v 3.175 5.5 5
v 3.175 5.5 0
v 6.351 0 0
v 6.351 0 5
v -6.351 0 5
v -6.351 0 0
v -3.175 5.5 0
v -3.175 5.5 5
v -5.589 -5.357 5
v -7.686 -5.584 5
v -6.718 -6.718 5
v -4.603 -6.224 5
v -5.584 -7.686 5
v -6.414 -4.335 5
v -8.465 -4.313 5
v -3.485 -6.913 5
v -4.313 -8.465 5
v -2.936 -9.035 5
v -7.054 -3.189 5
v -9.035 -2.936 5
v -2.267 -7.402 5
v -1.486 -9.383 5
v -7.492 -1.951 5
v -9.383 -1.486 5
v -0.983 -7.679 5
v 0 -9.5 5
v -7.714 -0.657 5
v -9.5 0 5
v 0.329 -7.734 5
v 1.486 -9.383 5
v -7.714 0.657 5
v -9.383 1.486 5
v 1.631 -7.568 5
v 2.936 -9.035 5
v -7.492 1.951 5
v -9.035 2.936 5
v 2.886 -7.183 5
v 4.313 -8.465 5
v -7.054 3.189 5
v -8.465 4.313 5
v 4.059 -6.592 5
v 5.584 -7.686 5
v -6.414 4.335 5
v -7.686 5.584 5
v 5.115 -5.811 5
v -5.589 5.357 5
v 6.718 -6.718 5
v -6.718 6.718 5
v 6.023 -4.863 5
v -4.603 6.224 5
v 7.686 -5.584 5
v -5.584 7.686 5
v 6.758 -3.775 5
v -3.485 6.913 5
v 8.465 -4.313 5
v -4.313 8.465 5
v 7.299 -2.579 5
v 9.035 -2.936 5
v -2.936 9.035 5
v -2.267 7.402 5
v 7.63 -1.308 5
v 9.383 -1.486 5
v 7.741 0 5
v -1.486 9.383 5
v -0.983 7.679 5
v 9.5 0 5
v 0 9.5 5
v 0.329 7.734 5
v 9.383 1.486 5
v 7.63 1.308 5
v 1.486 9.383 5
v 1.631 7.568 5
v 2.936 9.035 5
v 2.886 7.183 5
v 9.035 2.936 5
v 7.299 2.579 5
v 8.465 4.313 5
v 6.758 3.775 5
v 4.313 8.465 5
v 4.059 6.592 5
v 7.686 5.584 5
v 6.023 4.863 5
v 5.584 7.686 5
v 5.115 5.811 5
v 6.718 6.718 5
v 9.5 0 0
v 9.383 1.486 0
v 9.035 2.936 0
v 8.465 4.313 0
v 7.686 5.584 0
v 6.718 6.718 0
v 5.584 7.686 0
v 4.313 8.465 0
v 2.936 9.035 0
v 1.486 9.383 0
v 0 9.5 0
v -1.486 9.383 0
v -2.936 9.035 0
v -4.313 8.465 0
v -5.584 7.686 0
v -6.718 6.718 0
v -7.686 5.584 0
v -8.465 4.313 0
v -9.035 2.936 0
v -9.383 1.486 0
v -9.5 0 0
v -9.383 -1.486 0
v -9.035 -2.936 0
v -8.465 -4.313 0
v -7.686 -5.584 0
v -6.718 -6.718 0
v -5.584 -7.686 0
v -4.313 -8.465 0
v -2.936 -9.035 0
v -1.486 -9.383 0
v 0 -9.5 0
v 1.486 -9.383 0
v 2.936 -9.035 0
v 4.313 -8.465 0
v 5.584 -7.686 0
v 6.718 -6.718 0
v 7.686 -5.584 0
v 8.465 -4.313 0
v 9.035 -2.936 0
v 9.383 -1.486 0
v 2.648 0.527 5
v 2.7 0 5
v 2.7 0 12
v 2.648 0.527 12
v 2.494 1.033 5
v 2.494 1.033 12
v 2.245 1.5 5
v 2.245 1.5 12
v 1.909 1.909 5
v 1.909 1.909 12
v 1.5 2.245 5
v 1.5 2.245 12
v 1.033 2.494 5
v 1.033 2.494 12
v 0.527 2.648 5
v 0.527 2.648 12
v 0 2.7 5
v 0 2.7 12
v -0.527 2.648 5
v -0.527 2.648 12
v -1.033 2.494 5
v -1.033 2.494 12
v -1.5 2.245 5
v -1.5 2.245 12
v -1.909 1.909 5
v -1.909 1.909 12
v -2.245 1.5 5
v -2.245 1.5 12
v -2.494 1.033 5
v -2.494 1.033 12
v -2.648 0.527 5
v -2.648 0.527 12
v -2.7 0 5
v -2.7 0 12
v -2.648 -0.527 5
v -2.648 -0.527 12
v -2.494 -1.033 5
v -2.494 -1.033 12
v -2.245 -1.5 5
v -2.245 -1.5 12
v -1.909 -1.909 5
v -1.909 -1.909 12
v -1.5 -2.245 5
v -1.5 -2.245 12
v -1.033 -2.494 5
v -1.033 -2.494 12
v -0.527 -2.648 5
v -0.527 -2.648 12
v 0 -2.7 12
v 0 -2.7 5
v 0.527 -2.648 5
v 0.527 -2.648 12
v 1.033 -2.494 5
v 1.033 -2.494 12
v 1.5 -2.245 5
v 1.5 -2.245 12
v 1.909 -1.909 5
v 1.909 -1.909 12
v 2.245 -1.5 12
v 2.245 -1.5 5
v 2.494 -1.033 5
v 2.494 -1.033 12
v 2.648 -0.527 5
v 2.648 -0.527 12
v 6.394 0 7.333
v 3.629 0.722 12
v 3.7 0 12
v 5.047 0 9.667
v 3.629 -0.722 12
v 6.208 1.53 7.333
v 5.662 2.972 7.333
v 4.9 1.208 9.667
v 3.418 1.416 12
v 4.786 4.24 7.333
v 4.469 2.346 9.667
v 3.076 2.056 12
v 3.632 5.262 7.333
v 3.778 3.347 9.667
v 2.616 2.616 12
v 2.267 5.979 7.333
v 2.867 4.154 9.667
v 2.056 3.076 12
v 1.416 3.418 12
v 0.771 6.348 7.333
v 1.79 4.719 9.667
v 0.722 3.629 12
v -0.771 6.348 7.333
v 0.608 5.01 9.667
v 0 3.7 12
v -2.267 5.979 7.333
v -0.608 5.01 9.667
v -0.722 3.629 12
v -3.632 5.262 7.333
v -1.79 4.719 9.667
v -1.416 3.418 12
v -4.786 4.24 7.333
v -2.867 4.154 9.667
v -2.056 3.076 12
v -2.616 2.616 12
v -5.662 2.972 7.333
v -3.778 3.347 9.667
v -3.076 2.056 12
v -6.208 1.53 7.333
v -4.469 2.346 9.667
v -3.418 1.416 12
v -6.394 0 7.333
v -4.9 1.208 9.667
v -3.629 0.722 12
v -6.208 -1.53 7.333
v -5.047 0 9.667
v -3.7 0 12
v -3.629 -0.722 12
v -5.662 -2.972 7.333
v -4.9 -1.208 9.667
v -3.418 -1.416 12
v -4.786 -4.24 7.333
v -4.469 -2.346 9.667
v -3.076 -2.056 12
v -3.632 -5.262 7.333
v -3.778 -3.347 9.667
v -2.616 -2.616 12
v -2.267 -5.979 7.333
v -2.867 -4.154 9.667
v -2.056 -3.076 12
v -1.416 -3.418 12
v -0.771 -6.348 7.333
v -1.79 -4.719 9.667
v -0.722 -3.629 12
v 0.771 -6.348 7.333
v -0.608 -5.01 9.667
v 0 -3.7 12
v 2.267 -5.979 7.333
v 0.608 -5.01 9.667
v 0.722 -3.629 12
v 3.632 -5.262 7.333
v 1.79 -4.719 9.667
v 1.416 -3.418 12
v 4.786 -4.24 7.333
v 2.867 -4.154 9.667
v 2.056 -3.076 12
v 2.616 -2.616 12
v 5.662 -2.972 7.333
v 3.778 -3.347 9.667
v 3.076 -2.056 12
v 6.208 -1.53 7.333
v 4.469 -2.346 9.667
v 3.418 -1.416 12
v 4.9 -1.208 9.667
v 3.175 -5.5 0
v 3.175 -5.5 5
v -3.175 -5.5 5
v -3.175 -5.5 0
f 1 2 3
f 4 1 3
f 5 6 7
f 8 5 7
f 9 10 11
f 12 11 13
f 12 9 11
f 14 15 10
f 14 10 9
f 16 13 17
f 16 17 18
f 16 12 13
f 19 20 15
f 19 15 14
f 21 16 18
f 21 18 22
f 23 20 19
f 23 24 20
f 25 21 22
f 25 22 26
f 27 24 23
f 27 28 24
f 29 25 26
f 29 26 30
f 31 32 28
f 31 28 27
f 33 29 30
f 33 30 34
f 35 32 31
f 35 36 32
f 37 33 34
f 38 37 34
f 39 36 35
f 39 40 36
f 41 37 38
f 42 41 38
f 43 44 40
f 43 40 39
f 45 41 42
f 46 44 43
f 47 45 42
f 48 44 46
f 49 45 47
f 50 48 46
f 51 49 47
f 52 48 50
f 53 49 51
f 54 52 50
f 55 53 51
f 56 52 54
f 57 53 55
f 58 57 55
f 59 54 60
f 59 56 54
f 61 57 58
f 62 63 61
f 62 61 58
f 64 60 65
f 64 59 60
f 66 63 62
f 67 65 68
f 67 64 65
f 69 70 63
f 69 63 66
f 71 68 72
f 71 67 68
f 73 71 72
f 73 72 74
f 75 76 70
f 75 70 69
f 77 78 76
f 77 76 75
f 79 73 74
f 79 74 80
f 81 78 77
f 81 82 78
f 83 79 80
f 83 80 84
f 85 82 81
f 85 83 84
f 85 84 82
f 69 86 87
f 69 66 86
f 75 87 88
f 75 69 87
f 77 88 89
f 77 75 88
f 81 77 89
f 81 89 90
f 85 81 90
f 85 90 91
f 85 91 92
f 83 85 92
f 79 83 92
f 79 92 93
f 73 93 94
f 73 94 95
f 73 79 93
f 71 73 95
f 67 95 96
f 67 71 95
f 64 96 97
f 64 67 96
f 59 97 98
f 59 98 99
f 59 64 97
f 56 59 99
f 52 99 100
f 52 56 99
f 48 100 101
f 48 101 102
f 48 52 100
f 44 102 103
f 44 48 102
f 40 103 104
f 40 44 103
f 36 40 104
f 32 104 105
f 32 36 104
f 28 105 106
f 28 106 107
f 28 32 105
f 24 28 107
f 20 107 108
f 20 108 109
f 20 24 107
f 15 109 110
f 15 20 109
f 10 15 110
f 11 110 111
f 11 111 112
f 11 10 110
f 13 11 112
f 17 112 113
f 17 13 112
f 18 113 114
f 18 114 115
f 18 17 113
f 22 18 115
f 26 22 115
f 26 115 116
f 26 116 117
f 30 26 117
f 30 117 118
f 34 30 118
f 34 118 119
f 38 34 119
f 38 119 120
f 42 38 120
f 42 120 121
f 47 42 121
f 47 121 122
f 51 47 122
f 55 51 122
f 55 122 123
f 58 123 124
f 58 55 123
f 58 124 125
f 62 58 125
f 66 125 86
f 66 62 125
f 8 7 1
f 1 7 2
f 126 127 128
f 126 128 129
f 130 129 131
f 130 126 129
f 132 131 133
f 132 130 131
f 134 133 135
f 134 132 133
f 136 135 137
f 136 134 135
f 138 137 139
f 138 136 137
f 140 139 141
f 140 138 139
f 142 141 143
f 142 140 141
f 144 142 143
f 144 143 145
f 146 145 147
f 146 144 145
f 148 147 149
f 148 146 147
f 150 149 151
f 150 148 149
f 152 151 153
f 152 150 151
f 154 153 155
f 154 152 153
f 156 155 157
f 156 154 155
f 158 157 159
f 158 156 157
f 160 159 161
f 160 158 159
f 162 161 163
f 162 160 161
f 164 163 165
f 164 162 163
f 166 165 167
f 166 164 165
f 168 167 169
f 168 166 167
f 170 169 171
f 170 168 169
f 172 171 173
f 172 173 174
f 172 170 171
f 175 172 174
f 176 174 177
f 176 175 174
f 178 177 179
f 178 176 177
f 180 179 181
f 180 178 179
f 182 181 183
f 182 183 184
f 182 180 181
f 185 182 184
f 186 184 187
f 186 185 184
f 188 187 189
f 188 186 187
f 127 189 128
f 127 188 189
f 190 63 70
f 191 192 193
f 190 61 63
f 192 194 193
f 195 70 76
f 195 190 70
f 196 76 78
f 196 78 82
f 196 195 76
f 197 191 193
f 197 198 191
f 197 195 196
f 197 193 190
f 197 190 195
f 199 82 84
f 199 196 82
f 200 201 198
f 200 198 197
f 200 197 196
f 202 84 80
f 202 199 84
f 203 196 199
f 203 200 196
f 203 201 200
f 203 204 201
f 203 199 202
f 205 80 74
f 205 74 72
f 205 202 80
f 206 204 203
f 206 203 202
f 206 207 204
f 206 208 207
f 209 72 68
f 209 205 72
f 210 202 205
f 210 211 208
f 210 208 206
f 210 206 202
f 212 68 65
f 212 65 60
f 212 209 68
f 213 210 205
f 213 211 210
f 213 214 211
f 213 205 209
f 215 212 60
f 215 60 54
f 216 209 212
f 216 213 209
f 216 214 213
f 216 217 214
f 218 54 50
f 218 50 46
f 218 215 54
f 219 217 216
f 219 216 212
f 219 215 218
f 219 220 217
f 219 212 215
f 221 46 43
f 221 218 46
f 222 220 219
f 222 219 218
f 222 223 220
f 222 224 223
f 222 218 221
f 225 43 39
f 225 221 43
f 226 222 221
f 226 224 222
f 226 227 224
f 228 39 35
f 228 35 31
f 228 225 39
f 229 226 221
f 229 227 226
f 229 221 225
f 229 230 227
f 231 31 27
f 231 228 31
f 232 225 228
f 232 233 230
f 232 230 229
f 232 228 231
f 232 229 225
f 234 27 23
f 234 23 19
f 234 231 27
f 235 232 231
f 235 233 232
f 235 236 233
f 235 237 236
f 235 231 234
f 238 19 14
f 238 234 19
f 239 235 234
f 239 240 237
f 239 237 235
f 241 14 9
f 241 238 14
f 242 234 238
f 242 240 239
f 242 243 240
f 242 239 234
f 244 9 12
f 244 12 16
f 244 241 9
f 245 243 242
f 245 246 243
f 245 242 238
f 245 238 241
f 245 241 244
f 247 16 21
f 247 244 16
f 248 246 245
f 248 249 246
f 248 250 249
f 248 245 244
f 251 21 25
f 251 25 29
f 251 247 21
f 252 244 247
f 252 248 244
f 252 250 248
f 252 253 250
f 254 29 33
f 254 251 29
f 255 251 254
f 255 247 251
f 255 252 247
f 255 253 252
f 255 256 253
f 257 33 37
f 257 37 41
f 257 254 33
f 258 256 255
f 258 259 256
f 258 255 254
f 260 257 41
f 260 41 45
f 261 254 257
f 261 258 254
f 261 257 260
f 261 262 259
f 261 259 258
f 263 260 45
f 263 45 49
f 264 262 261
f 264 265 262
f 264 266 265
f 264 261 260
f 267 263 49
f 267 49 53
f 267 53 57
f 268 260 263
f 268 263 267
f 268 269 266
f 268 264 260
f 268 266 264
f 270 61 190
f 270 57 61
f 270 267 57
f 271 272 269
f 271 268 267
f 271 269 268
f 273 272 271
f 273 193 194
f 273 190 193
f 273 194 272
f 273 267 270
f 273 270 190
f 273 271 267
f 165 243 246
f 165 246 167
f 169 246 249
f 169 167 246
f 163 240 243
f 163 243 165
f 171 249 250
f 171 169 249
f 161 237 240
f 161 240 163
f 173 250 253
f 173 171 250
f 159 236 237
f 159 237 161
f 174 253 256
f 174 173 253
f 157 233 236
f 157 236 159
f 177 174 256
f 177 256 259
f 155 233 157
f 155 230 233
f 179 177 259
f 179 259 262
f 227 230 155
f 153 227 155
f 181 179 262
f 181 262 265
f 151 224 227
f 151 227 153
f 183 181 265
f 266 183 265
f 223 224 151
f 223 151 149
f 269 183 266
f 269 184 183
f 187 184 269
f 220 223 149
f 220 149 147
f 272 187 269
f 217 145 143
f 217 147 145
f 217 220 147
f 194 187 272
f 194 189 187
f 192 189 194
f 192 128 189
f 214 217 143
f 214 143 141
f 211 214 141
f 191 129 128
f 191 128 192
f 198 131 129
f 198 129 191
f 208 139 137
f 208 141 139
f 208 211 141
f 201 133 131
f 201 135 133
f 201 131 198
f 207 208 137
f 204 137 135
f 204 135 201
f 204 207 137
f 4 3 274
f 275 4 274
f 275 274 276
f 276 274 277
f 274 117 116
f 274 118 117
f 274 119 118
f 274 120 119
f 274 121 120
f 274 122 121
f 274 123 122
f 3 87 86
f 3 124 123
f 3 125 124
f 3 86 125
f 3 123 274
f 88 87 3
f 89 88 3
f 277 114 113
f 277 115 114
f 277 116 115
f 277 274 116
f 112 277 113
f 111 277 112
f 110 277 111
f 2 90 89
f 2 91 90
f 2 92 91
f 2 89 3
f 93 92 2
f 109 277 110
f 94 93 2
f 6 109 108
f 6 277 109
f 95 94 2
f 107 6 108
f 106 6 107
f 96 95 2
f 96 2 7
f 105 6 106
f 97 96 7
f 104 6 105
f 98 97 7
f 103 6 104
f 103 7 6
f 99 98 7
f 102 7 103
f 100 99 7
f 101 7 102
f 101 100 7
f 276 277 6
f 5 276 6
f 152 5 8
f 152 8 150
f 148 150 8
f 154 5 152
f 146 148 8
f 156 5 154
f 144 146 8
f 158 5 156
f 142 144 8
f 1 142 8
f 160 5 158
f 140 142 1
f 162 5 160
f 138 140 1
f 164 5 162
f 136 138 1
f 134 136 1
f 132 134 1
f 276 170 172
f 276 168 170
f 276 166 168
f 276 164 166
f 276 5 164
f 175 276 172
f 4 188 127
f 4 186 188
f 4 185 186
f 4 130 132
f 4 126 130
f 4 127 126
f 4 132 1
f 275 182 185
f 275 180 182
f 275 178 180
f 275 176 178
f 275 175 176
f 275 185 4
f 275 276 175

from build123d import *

# Parameters (mm, degrees)
POCKET_DEPTH = 5


with BuildPart() as part:
    # Sketch → Revolution (revolve)
    with BuildSketch(Plane.XZ):
        Polygon((2.7, 12), (2.7, 0), (9.5, 0), (9.5, 5), (7.741452, 5), (3.7, 12), align=None)
    revolve(axis=Axis((0, 0, 0), (0, 0, 1)))

    # Sketch001 (on DatumPlane) → Pocket (cut)
    with BuildSketch(Plane(origin=(0, 0, 0), x_dir=(1, 0, 0), z_dir=(0, 0, -1))):
        Polygon((3.175426, -5.5), (6.350853, 0), (3.175426, 5.5), (-3.175426, 5.5), (-6.350853, 0), (-3.175426, -5.5), align=None)
    extrude(amount=-POCKET_DEPTH, mode=Mode.SUBTRACT)


solid = part.part
